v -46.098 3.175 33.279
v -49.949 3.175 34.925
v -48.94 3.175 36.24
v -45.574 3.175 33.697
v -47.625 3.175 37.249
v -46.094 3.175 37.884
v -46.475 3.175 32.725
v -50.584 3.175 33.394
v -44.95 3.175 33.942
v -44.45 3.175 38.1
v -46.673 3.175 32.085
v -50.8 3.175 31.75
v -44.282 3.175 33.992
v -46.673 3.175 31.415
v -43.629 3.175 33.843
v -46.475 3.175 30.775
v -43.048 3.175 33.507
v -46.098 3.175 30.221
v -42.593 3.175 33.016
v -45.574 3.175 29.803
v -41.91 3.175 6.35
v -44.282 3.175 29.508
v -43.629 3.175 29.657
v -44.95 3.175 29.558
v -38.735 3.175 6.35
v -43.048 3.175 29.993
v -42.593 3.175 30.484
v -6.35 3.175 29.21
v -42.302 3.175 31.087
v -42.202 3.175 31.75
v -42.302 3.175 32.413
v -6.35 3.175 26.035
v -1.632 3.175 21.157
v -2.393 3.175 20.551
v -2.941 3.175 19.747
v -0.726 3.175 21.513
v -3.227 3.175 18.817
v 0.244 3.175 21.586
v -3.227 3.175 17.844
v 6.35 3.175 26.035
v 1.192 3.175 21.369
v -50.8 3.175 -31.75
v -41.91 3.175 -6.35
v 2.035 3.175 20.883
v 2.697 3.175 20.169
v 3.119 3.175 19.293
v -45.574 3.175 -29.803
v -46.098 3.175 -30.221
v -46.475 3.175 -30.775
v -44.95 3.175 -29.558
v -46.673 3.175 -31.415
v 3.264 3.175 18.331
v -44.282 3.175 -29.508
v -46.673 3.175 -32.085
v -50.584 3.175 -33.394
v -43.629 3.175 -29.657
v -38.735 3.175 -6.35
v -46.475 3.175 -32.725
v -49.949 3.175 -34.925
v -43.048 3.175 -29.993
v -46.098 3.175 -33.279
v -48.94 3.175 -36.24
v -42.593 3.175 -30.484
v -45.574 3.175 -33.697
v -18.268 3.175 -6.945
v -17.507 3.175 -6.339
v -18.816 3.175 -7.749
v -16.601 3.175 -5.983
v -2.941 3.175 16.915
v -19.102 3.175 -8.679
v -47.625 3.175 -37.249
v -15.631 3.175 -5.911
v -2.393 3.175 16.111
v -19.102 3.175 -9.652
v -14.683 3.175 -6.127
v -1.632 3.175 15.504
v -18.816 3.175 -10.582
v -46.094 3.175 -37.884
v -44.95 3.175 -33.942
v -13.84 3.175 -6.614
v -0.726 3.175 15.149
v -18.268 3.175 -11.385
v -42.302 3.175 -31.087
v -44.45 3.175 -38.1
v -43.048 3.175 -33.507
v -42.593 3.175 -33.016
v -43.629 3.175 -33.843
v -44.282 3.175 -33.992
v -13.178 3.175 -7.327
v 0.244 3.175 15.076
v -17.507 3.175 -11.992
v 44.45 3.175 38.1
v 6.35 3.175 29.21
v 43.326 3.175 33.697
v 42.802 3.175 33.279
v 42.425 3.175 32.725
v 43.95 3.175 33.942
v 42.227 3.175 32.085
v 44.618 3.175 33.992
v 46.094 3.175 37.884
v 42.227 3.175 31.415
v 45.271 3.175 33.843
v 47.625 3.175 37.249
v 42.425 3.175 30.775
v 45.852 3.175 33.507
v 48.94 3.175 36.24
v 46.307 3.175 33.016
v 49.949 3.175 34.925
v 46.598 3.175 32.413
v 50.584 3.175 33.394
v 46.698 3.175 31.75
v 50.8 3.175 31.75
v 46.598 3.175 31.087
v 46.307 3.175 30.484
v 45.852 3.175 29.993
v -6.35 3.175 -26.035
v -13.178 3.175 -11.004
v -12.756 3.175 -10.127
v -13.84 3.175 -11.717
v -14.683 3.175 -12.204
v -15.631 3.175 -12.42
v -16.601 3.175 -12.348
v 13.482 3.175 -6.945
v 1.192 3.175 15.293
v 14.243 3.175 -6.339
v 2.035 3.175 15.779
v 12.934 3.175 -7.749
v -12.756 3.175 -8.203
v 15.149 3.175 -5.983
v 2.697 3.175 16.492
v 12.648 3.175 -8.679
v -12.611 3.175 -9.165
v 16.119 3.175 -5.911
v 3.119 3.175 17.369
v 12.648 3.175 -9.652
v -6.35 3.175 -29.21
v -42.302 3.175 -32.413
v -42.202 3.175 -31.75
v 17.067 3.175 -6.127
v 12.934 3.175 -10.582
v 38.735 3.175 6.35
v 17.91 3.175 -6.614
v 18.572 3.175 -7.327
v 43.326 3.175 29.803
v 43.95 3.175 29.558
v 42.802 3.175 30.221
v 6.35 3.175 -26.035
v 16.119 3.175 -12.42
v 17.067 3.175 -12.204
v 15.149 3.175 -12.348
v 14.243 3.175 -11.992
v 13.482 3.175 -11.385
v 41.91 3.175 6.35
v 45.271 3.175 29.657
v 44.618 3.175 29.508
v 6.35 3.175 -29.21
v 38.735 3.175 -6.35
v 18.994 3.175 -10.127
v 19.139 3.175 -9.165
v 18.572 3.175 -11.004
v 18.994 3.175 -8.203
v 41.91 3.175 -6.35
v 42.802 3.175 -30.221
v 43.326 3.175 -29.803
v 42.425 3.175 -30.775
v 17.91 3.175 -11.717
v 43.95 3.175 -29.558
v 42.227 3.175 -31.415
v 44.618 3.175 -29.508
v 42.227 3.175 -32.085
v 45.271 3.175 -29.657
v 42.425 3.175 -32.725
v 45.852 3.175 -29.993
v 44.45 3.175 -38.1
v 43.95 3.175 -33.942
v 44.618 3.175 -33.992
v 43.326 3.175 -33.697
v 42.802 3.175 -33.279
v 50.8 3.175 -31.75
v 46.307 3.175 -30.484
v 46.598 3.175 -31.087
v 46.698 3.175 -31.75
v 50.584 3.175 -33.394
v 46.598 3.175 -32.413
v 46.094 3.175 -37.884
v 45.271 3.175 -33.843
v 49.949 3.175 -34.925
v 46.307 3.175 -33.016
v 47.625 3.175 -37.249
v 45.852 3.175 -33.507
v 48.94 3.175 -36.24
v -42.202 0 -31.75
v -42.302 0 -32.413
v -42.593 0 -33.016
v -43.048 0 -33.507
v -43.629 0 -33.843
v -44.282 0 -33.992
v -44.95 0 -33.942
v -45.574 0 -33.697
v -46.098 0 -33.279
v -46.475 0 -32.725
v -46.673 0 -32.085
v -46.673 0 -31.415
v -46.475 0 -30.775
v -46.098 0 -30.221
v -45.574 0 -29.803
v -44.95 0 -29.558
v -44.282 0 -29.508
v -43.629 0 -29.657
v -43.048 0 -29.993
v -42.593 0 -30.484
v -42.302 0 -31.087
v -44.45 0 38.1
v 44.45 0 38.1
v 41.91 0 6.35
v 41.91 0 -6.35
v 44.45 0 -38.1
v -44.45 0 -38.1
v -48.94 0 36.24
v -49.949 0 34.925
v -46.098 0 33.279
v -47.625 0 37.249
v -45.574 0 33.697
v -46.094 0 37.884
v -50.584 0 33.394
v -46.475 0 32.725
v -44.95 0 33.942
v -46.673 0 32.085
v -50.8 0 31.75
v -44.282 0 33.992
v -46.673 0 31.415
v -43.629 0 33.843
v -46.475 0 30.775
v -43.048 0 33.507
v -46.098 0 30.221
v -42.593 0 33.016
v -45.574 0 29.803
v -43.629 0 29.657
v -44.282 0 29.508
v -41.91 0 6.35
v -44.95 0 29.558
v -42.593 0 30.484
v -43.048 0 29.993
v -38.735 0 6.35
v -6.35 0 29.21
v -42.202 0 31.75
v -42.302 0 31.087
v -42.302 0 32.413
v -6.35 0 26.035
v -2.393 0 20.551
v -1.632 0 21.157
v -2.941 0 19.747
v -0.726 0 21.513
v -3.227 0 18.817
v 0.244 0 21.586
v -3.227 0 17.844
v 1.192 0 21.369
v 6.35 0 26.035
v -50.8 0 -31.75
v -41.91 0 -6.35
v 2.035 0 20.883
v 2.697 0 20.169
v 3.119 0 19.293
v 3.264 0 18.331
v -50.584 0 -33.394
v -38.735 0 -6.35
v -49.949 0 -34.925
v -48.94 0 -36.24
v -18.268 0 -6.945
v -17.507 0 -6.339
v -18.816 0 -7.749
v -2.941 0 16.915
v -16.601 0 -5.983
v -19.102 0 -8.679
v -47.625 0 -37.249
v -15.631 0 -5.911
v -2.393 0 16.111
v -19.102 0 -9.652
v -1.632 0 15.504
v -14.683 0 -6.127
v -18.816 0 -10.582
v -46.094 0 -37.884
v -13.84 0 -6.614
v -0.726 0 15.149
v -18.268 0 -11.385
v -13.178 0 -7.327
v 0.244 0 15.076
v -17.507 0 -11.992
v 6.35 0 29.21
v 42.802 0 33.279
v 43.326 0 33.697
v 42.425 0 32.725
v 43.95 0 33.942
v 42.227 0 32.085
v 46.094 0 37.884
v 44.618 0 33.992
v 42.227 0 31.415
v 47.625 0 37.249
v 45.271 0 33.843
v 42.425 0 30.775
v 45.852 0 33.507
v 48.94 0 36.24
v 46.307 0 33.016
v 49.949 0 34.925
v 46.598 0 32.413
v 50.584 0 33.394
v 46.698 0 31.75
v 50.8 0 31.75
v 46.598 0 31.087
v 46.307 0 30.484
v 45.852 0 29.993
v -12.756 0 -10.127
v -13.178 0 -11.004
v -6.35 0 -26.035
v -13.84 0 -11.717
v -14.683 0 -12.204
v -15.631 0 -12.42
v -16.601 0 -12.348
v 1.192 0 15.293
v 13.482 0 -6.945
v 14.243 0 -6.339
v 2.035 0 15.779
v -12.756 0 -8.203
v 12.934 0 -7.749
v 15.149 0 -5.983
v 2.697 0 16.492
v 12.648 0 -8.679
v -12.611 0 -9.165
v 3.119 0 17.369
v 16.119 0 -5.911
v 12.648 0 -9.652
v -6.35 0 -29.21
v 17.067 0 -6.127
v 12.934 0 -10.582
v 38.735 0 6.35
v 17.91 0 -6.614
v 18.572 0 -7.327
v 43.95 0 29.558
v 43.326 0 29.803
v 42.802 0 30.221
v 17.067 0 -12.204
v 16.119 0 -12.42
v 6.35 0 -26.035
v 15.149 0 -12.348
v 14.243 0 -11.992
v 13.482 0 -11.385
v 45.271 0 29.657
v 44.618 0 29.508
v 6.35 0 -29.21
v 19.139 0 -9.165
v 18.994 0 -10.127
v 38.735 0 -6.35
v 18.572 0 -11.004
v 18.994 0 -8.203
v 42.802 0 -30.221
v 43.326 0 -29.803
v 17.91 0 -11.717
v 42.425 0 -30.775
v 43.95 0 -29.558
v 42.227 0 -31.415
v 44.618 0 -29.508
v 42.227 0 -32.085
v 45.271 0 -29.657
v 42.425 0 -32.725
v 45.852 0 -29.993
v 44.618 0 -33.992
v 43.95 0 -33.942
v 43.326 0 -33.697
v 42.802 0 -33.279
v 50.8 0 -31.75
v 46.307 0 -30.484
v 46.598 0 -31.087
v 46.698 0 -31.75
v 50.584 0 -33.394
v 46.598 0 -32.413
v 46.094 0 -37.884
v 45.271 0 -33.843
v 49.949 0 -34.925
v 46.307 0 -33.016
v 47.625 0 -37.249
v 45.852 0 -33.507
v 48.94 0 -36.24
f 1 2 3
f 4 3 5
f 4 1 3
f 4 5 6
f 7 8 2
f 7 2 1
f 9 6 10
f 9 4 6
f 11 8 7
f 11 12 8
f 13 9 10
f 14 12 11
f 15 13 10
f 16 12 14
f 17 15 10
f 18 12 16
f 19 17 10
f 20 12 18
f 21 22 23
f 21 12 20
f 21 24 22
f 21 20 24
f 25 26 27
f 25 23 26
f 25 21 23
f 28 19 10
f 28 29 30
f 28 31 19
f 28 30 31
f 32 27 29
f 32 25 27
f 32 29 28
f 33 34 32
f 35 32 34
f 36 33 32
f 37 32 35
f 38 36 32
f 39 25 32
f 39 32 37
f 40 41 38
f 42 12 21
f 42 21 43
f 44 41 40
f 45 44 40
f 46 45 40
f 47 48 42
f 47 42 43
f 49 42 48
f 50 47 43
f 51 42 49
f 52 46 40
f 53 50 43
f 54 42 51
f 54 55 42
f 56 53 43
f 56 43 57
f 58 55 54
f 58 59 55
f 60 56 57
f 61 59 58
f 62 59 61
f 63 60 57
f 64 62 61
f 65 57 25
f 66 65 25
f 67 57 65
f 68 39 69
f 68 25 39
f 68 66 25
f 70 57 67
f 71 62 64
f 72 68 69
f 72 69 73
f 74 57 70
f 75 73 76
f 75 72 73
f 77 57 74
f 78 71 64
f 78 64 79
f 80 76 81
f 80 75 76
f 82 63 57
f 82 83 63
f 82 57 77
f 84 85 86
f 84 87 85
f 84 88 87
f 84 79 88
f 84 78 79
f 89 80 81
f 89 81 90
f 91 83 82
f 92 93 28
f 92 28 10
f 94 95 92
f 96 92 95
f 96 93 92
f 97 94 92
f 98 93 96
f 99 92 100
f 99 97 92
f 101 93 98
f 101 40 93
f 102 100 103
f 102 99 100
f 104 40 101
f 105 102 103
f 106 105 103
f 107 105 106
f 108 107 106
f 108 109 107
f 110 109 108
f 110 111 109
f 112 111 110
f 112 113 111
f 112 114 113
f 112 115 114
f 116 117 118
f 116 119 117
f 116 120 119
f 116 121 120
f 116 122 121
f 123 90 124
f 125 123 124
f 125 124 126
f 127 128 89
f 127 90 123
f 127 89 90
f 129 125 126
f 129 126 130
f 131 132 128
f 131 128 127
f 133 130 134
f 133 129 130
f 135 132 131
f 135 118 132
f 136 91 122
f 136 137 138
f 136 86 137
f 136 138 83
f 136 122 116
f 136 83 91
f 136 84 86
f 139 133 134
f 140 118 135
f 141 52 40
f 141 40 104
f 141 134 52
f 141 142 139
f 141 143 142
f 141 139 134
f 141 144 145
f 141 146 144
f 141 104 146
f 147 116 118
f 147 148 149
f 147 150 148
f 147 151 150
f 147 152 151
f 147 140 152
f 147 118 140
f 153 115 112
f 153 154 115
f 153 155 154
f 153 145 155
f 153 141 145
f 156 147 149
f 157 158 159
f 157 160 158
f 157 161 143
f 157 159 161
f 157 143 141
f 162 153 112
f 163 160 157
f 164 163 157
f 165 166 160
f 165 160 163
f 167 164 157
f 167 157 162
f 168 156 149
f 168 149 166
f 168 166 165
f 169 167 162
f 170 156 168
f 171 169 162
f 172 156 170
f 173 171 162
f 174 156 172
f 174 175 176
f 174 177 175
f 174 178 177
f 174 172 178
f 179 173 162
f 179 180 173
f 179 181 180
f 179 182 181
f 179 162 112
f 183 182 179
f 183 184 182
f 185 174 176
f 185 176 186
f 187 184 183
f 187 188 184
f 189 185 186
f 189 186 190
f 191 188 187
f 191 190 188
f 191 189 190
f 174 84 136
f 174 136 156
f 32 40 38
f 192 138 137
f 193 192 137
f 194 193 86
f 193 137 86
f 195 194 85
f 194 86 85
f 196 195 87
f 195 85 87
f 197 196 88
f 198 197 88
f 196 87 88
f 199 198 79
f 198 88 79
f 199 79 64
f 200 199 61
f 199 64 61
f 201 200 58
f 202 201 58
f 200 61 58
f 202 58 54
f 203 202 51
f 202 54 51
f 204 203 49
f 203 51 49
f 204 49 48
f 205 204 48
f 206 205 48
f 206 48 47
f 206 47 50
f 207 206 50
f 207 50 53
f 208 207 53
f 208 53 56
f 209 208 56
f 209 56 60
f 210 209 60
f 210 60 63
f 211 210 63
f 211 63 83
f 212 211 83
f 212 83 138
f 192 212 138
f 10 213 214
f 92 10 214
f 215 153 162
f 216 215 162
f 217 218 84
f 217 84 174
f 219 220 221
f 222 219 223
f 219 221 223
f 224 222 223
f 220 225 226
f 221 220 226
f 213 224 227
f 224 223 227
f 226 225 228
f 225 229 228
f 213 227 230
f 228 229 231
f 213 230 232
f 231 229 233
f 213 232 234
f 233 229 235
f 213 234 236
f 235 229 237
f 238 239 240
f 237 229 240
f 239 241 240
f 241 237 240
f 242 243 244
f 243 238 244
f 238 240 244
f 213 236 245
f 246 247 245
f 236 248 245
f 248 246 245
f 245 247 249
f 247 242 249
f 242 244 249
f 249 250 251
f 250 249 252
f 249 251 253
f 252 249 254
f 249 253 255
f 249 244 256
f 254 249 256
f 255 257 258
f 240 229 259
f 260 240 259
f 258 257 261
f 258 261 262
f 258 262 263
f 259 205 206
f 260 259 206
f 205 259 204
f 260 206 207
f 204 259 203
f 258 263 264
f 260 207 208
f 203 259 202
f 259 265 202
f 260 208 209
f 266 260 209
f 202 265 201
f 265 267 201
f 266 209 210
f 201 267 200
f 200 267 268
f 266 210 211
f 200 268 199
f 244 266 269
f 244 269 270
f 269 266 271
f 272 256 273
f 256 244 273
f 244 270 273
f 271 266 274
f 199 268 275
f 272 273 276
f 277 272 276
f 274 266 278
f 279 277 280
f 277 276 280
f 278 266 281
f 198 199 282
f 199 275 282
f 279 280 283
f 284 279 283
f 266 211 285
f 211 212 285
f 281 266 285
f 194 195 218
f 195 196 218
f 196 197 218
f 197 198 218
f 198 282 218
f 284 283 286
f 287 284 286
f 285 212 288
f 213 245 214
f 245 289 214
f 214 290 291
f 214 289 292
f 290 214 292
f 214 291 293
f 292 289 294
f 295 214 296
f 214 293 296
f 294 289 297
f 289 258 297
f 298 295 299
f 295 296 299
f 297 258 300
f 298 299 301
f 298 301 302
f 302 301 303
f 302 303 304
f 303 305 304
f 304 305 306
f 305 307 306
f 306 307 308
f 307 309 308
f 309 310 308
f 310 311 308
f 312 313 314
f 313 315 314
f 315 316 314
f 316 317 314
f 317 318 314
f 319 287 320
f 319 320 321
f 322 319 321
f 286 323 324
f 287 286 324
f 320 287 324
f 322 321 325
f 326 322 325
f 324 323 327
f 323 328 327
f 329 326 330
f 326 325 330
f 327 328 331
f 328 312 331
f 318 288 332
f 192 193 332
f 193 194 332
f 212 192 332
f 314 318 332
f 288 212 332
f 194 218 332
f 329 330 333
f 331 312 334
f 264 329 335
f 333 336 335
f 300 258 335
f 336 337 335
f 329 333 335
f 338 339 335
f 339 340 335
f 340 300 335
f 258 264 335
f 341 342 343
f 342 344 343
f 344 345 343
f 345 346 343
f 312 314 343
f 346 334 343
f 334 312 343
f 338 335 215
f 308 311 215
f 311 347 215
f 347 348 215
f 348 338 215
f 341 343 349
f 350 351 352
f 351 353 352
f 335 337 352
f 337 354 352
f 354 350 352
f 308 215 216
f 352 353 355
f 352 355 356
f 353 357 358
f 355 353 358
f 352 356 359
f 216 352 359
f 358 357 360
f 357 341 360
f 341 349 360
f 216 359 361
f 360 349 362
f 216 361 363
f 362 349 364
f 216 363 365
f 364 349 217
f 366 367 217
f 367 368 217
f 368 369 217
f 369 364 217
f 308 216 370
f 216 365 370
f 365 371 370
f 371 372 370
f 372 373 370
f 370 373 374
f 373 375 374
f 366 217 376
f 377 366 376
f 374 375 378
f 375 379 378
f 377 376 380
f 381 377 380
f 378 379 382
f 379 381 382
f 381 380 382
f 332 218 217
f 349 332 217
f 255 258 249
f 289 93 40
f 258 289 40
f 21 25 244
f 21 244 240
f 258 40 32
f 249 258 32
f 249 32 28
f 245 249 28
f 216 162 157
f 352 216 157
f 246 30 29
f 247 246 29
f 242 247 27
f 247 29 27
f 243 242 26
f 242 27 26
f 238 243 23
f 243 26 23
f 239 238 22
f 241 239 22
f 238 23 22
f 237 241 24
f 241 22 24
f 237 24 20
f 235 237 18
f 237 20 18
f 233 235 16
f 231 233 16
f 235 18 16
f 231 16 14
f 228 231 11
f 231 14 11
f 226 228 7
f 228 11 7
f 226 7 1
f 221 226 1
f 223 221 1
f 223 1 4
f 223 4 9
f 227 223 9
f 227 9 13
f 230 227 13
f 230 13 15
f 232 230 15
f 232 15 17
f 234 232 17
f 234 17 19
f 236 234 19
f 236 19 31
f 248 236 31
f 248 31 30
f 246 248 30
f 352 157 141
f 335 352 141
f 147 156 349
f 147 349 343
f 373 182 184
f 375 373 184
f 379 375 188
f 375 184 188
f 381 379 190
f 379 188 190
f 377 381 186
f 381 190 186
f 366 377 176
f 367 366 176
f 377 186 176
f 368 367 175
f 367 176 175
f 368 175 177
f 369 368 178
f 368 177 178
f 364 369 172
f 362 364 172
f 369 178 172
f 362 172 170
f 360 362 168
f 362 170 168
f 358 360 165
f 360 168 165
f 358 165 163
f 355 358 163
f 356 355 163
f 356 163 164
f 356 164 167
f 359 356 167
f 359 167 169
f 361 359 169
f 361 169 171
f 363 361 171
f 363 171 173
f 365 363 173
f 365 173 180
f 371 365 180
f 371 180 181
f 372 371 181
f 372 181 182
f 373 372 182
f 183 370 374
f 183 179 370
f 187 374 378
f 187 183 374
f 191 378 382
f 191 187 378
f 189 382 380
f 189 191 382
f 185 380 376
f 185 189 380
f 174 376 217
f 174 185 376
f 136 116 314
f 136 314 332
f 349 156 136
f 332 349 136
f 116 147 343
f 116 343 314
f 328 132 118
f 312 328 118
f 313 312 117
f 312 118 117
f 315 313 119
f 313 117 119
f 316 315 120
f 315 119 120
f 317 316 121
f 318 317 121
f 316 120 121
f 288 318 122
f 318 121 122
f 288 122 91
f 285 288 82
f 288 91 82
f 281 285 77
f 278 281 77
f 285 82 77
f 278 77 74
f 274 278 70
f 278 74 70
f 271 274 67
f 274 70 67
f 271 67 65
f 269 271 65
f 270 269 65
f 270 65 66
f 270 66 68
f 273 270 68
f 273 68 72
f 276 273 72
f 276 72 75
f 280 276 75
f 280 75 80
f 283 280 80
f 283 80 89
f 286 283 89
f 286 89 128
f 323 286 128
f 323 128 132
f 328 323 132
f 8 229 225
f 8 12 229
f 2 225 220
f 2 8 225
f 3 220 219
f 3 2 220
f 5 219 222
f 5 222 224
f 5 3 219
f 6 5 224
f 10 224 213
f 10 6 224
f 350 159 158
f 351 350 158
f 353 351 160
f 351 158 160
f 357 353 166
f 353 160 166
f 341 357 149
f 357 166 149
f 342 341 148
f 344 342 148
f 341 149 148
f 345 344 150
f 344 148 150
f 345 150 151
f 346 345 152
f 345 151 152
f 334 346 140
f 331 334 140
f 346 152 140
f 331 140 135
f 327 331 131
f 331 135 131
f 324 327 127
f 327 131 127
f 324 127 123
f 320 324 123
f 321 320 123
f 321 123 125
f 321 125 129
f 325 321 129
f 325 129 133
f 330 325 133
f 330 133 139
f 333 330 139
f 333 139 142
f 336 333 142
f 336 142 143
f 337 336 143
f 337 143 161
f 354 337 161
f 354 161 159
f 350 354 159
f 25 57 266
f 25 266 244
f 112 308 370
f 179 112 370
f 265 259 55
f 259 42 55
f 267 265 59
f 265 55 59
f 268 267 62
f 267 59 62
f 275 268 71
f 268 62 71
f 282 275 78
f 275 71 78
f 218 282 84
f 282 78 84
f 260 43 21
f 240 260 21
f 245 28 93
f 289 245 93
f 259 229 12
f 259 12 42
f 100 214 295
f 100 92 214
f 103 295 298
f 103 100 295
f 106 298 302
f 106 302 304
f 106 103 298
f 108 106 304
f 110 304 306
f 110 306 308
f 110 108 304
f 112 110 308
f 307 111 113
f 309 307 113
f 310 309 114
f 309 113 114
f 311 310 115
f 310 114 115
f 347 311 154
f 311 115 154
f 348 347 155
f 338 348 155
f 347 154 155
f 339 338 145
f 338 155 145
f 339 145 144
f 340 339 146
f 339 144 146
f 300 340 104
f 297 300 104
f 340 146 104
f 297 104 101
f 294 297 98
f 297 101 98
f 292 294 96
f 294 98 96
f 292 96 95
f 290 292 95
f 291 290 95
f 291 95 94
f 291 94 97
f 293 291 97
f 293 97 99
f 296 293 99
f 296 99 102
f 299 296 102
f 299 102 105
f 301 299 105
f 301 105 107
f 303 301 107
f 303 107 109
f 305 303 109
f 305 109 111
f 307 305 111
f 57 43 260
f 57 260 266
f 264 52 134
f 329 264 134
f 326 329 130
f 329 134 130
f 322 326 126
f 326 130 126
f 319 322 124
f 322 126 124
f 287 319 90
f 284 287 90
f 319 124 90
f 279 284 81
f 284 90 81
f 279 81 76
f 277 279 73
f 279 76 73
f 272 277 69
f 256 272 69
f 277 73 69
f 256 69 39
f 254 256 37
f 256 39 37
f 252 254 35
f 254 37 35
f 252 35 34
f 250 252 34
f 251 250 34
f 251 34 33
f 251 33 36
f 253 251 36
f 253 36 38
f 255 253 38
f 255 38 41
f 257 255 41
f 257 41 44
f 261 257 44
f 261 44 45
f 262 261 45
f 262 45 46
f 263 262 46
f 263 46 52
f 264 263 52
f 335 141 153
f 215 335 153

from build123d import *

# Parameters (mm, degrees)
SKETCH1_W           = 101.6
SKETCH1_H           = 76.2
BOSS_EXTRUDE1_DEPTH = 3.175
FILLET1_R           = 6.35
SKETCH2_R           = 2.2479
CUT_EXTRUDE1_DEPTH  = 4.175
SKETCH3_R           = 3.2639
CUT_EXTRUDE2_DEPTH  = 4.175


with BuildPart() as part:
    # Sketch1 → Boss-Extrude1 (new body)
    with BuildSketch(Plane(origin=(0, 0, 0), x_dir=(1, 0, 0), z_dir=(0, 1, 0))):
        Rectangle(SKETCH1_W, SKETCH1_H)
    extrude(amount=BOSS_EXTRUDE1_DEPTH)

    # Fillet1
    fillet1_edges = [part.edges().sort_by_distance(p)[0] for p in [
        (50.8, 1.5875, 38.1),
        (-50.8, 1.5875, 38.1),
        (-50.8, 1.5875, -38.1),
        (50.8, 1.5875, -38.1),
    ]]
    fillet(fillet1_edges, radius=FILLET1_R)

    # Sketch2 → Cut-Extrude1 (cut, through all)
    with BuildSketch(Plane(origin=(0, 3.175, 0), x_dir=(1, 0, 0), z_dir=(0, 1, 0))):
        with Locations((-44.45, 31.75)):
            Circle(SKETCH2_R)
        with Locations((44.45, 31.75)):
            Circle(SKETCH2_R)
        with Locations((44.45, -31.75)):
            Circle(SKETCH2_R)
        with Locations((-44.45, -31.75)):
            Circle(SKETCH2_R)
        Polygon((-41.91, 0), (-41.91, 6.35), (-38.735, 6.35), (-38.735, -6.35), (-41.91, -6.35), align=None)
        Polygon((0, 29.21), (6.35, 29.21), (6.35, 26.035), (-6.35, 26.035), (-6.35, 29.21), align=None)
        Polygon((41.91, 0), (41.91, 6.35), (38.735, 6.35), (38.735, -6.35), (41.91, -6.35), align=None)
        Polygon((0, -29.21), (6.35, -29.21), (6.35, -26.035), (-6.35, -26.035), (-6.35, -29.21), align=None)
    extrude(amount=-CUT_EXTRUDE1_DEPTH, mode=Mode.SUBTRACT)

    # Sketch3 → Cut-Extrude2 (cut, through all)
    with BuildSketch(Plane(origin=(0, 3.175, 0), x_dir=(1, 0, 0), z_dir=(0, 1, 0))):
        with Locations((-15.875, 9.165435523)):
            Circle(SKETCH3_R)
        with Locations((15.875, 9.165435523)):
            Circle(SKETCH3_R)
        with Locations((0, -18.330871047)):
            Circle(SKETCH3_R)
    extrude(amount=-CUT_EXTRUDE2_DEPTH, mode=Mode.SUBTRACT)


solid = part.part
